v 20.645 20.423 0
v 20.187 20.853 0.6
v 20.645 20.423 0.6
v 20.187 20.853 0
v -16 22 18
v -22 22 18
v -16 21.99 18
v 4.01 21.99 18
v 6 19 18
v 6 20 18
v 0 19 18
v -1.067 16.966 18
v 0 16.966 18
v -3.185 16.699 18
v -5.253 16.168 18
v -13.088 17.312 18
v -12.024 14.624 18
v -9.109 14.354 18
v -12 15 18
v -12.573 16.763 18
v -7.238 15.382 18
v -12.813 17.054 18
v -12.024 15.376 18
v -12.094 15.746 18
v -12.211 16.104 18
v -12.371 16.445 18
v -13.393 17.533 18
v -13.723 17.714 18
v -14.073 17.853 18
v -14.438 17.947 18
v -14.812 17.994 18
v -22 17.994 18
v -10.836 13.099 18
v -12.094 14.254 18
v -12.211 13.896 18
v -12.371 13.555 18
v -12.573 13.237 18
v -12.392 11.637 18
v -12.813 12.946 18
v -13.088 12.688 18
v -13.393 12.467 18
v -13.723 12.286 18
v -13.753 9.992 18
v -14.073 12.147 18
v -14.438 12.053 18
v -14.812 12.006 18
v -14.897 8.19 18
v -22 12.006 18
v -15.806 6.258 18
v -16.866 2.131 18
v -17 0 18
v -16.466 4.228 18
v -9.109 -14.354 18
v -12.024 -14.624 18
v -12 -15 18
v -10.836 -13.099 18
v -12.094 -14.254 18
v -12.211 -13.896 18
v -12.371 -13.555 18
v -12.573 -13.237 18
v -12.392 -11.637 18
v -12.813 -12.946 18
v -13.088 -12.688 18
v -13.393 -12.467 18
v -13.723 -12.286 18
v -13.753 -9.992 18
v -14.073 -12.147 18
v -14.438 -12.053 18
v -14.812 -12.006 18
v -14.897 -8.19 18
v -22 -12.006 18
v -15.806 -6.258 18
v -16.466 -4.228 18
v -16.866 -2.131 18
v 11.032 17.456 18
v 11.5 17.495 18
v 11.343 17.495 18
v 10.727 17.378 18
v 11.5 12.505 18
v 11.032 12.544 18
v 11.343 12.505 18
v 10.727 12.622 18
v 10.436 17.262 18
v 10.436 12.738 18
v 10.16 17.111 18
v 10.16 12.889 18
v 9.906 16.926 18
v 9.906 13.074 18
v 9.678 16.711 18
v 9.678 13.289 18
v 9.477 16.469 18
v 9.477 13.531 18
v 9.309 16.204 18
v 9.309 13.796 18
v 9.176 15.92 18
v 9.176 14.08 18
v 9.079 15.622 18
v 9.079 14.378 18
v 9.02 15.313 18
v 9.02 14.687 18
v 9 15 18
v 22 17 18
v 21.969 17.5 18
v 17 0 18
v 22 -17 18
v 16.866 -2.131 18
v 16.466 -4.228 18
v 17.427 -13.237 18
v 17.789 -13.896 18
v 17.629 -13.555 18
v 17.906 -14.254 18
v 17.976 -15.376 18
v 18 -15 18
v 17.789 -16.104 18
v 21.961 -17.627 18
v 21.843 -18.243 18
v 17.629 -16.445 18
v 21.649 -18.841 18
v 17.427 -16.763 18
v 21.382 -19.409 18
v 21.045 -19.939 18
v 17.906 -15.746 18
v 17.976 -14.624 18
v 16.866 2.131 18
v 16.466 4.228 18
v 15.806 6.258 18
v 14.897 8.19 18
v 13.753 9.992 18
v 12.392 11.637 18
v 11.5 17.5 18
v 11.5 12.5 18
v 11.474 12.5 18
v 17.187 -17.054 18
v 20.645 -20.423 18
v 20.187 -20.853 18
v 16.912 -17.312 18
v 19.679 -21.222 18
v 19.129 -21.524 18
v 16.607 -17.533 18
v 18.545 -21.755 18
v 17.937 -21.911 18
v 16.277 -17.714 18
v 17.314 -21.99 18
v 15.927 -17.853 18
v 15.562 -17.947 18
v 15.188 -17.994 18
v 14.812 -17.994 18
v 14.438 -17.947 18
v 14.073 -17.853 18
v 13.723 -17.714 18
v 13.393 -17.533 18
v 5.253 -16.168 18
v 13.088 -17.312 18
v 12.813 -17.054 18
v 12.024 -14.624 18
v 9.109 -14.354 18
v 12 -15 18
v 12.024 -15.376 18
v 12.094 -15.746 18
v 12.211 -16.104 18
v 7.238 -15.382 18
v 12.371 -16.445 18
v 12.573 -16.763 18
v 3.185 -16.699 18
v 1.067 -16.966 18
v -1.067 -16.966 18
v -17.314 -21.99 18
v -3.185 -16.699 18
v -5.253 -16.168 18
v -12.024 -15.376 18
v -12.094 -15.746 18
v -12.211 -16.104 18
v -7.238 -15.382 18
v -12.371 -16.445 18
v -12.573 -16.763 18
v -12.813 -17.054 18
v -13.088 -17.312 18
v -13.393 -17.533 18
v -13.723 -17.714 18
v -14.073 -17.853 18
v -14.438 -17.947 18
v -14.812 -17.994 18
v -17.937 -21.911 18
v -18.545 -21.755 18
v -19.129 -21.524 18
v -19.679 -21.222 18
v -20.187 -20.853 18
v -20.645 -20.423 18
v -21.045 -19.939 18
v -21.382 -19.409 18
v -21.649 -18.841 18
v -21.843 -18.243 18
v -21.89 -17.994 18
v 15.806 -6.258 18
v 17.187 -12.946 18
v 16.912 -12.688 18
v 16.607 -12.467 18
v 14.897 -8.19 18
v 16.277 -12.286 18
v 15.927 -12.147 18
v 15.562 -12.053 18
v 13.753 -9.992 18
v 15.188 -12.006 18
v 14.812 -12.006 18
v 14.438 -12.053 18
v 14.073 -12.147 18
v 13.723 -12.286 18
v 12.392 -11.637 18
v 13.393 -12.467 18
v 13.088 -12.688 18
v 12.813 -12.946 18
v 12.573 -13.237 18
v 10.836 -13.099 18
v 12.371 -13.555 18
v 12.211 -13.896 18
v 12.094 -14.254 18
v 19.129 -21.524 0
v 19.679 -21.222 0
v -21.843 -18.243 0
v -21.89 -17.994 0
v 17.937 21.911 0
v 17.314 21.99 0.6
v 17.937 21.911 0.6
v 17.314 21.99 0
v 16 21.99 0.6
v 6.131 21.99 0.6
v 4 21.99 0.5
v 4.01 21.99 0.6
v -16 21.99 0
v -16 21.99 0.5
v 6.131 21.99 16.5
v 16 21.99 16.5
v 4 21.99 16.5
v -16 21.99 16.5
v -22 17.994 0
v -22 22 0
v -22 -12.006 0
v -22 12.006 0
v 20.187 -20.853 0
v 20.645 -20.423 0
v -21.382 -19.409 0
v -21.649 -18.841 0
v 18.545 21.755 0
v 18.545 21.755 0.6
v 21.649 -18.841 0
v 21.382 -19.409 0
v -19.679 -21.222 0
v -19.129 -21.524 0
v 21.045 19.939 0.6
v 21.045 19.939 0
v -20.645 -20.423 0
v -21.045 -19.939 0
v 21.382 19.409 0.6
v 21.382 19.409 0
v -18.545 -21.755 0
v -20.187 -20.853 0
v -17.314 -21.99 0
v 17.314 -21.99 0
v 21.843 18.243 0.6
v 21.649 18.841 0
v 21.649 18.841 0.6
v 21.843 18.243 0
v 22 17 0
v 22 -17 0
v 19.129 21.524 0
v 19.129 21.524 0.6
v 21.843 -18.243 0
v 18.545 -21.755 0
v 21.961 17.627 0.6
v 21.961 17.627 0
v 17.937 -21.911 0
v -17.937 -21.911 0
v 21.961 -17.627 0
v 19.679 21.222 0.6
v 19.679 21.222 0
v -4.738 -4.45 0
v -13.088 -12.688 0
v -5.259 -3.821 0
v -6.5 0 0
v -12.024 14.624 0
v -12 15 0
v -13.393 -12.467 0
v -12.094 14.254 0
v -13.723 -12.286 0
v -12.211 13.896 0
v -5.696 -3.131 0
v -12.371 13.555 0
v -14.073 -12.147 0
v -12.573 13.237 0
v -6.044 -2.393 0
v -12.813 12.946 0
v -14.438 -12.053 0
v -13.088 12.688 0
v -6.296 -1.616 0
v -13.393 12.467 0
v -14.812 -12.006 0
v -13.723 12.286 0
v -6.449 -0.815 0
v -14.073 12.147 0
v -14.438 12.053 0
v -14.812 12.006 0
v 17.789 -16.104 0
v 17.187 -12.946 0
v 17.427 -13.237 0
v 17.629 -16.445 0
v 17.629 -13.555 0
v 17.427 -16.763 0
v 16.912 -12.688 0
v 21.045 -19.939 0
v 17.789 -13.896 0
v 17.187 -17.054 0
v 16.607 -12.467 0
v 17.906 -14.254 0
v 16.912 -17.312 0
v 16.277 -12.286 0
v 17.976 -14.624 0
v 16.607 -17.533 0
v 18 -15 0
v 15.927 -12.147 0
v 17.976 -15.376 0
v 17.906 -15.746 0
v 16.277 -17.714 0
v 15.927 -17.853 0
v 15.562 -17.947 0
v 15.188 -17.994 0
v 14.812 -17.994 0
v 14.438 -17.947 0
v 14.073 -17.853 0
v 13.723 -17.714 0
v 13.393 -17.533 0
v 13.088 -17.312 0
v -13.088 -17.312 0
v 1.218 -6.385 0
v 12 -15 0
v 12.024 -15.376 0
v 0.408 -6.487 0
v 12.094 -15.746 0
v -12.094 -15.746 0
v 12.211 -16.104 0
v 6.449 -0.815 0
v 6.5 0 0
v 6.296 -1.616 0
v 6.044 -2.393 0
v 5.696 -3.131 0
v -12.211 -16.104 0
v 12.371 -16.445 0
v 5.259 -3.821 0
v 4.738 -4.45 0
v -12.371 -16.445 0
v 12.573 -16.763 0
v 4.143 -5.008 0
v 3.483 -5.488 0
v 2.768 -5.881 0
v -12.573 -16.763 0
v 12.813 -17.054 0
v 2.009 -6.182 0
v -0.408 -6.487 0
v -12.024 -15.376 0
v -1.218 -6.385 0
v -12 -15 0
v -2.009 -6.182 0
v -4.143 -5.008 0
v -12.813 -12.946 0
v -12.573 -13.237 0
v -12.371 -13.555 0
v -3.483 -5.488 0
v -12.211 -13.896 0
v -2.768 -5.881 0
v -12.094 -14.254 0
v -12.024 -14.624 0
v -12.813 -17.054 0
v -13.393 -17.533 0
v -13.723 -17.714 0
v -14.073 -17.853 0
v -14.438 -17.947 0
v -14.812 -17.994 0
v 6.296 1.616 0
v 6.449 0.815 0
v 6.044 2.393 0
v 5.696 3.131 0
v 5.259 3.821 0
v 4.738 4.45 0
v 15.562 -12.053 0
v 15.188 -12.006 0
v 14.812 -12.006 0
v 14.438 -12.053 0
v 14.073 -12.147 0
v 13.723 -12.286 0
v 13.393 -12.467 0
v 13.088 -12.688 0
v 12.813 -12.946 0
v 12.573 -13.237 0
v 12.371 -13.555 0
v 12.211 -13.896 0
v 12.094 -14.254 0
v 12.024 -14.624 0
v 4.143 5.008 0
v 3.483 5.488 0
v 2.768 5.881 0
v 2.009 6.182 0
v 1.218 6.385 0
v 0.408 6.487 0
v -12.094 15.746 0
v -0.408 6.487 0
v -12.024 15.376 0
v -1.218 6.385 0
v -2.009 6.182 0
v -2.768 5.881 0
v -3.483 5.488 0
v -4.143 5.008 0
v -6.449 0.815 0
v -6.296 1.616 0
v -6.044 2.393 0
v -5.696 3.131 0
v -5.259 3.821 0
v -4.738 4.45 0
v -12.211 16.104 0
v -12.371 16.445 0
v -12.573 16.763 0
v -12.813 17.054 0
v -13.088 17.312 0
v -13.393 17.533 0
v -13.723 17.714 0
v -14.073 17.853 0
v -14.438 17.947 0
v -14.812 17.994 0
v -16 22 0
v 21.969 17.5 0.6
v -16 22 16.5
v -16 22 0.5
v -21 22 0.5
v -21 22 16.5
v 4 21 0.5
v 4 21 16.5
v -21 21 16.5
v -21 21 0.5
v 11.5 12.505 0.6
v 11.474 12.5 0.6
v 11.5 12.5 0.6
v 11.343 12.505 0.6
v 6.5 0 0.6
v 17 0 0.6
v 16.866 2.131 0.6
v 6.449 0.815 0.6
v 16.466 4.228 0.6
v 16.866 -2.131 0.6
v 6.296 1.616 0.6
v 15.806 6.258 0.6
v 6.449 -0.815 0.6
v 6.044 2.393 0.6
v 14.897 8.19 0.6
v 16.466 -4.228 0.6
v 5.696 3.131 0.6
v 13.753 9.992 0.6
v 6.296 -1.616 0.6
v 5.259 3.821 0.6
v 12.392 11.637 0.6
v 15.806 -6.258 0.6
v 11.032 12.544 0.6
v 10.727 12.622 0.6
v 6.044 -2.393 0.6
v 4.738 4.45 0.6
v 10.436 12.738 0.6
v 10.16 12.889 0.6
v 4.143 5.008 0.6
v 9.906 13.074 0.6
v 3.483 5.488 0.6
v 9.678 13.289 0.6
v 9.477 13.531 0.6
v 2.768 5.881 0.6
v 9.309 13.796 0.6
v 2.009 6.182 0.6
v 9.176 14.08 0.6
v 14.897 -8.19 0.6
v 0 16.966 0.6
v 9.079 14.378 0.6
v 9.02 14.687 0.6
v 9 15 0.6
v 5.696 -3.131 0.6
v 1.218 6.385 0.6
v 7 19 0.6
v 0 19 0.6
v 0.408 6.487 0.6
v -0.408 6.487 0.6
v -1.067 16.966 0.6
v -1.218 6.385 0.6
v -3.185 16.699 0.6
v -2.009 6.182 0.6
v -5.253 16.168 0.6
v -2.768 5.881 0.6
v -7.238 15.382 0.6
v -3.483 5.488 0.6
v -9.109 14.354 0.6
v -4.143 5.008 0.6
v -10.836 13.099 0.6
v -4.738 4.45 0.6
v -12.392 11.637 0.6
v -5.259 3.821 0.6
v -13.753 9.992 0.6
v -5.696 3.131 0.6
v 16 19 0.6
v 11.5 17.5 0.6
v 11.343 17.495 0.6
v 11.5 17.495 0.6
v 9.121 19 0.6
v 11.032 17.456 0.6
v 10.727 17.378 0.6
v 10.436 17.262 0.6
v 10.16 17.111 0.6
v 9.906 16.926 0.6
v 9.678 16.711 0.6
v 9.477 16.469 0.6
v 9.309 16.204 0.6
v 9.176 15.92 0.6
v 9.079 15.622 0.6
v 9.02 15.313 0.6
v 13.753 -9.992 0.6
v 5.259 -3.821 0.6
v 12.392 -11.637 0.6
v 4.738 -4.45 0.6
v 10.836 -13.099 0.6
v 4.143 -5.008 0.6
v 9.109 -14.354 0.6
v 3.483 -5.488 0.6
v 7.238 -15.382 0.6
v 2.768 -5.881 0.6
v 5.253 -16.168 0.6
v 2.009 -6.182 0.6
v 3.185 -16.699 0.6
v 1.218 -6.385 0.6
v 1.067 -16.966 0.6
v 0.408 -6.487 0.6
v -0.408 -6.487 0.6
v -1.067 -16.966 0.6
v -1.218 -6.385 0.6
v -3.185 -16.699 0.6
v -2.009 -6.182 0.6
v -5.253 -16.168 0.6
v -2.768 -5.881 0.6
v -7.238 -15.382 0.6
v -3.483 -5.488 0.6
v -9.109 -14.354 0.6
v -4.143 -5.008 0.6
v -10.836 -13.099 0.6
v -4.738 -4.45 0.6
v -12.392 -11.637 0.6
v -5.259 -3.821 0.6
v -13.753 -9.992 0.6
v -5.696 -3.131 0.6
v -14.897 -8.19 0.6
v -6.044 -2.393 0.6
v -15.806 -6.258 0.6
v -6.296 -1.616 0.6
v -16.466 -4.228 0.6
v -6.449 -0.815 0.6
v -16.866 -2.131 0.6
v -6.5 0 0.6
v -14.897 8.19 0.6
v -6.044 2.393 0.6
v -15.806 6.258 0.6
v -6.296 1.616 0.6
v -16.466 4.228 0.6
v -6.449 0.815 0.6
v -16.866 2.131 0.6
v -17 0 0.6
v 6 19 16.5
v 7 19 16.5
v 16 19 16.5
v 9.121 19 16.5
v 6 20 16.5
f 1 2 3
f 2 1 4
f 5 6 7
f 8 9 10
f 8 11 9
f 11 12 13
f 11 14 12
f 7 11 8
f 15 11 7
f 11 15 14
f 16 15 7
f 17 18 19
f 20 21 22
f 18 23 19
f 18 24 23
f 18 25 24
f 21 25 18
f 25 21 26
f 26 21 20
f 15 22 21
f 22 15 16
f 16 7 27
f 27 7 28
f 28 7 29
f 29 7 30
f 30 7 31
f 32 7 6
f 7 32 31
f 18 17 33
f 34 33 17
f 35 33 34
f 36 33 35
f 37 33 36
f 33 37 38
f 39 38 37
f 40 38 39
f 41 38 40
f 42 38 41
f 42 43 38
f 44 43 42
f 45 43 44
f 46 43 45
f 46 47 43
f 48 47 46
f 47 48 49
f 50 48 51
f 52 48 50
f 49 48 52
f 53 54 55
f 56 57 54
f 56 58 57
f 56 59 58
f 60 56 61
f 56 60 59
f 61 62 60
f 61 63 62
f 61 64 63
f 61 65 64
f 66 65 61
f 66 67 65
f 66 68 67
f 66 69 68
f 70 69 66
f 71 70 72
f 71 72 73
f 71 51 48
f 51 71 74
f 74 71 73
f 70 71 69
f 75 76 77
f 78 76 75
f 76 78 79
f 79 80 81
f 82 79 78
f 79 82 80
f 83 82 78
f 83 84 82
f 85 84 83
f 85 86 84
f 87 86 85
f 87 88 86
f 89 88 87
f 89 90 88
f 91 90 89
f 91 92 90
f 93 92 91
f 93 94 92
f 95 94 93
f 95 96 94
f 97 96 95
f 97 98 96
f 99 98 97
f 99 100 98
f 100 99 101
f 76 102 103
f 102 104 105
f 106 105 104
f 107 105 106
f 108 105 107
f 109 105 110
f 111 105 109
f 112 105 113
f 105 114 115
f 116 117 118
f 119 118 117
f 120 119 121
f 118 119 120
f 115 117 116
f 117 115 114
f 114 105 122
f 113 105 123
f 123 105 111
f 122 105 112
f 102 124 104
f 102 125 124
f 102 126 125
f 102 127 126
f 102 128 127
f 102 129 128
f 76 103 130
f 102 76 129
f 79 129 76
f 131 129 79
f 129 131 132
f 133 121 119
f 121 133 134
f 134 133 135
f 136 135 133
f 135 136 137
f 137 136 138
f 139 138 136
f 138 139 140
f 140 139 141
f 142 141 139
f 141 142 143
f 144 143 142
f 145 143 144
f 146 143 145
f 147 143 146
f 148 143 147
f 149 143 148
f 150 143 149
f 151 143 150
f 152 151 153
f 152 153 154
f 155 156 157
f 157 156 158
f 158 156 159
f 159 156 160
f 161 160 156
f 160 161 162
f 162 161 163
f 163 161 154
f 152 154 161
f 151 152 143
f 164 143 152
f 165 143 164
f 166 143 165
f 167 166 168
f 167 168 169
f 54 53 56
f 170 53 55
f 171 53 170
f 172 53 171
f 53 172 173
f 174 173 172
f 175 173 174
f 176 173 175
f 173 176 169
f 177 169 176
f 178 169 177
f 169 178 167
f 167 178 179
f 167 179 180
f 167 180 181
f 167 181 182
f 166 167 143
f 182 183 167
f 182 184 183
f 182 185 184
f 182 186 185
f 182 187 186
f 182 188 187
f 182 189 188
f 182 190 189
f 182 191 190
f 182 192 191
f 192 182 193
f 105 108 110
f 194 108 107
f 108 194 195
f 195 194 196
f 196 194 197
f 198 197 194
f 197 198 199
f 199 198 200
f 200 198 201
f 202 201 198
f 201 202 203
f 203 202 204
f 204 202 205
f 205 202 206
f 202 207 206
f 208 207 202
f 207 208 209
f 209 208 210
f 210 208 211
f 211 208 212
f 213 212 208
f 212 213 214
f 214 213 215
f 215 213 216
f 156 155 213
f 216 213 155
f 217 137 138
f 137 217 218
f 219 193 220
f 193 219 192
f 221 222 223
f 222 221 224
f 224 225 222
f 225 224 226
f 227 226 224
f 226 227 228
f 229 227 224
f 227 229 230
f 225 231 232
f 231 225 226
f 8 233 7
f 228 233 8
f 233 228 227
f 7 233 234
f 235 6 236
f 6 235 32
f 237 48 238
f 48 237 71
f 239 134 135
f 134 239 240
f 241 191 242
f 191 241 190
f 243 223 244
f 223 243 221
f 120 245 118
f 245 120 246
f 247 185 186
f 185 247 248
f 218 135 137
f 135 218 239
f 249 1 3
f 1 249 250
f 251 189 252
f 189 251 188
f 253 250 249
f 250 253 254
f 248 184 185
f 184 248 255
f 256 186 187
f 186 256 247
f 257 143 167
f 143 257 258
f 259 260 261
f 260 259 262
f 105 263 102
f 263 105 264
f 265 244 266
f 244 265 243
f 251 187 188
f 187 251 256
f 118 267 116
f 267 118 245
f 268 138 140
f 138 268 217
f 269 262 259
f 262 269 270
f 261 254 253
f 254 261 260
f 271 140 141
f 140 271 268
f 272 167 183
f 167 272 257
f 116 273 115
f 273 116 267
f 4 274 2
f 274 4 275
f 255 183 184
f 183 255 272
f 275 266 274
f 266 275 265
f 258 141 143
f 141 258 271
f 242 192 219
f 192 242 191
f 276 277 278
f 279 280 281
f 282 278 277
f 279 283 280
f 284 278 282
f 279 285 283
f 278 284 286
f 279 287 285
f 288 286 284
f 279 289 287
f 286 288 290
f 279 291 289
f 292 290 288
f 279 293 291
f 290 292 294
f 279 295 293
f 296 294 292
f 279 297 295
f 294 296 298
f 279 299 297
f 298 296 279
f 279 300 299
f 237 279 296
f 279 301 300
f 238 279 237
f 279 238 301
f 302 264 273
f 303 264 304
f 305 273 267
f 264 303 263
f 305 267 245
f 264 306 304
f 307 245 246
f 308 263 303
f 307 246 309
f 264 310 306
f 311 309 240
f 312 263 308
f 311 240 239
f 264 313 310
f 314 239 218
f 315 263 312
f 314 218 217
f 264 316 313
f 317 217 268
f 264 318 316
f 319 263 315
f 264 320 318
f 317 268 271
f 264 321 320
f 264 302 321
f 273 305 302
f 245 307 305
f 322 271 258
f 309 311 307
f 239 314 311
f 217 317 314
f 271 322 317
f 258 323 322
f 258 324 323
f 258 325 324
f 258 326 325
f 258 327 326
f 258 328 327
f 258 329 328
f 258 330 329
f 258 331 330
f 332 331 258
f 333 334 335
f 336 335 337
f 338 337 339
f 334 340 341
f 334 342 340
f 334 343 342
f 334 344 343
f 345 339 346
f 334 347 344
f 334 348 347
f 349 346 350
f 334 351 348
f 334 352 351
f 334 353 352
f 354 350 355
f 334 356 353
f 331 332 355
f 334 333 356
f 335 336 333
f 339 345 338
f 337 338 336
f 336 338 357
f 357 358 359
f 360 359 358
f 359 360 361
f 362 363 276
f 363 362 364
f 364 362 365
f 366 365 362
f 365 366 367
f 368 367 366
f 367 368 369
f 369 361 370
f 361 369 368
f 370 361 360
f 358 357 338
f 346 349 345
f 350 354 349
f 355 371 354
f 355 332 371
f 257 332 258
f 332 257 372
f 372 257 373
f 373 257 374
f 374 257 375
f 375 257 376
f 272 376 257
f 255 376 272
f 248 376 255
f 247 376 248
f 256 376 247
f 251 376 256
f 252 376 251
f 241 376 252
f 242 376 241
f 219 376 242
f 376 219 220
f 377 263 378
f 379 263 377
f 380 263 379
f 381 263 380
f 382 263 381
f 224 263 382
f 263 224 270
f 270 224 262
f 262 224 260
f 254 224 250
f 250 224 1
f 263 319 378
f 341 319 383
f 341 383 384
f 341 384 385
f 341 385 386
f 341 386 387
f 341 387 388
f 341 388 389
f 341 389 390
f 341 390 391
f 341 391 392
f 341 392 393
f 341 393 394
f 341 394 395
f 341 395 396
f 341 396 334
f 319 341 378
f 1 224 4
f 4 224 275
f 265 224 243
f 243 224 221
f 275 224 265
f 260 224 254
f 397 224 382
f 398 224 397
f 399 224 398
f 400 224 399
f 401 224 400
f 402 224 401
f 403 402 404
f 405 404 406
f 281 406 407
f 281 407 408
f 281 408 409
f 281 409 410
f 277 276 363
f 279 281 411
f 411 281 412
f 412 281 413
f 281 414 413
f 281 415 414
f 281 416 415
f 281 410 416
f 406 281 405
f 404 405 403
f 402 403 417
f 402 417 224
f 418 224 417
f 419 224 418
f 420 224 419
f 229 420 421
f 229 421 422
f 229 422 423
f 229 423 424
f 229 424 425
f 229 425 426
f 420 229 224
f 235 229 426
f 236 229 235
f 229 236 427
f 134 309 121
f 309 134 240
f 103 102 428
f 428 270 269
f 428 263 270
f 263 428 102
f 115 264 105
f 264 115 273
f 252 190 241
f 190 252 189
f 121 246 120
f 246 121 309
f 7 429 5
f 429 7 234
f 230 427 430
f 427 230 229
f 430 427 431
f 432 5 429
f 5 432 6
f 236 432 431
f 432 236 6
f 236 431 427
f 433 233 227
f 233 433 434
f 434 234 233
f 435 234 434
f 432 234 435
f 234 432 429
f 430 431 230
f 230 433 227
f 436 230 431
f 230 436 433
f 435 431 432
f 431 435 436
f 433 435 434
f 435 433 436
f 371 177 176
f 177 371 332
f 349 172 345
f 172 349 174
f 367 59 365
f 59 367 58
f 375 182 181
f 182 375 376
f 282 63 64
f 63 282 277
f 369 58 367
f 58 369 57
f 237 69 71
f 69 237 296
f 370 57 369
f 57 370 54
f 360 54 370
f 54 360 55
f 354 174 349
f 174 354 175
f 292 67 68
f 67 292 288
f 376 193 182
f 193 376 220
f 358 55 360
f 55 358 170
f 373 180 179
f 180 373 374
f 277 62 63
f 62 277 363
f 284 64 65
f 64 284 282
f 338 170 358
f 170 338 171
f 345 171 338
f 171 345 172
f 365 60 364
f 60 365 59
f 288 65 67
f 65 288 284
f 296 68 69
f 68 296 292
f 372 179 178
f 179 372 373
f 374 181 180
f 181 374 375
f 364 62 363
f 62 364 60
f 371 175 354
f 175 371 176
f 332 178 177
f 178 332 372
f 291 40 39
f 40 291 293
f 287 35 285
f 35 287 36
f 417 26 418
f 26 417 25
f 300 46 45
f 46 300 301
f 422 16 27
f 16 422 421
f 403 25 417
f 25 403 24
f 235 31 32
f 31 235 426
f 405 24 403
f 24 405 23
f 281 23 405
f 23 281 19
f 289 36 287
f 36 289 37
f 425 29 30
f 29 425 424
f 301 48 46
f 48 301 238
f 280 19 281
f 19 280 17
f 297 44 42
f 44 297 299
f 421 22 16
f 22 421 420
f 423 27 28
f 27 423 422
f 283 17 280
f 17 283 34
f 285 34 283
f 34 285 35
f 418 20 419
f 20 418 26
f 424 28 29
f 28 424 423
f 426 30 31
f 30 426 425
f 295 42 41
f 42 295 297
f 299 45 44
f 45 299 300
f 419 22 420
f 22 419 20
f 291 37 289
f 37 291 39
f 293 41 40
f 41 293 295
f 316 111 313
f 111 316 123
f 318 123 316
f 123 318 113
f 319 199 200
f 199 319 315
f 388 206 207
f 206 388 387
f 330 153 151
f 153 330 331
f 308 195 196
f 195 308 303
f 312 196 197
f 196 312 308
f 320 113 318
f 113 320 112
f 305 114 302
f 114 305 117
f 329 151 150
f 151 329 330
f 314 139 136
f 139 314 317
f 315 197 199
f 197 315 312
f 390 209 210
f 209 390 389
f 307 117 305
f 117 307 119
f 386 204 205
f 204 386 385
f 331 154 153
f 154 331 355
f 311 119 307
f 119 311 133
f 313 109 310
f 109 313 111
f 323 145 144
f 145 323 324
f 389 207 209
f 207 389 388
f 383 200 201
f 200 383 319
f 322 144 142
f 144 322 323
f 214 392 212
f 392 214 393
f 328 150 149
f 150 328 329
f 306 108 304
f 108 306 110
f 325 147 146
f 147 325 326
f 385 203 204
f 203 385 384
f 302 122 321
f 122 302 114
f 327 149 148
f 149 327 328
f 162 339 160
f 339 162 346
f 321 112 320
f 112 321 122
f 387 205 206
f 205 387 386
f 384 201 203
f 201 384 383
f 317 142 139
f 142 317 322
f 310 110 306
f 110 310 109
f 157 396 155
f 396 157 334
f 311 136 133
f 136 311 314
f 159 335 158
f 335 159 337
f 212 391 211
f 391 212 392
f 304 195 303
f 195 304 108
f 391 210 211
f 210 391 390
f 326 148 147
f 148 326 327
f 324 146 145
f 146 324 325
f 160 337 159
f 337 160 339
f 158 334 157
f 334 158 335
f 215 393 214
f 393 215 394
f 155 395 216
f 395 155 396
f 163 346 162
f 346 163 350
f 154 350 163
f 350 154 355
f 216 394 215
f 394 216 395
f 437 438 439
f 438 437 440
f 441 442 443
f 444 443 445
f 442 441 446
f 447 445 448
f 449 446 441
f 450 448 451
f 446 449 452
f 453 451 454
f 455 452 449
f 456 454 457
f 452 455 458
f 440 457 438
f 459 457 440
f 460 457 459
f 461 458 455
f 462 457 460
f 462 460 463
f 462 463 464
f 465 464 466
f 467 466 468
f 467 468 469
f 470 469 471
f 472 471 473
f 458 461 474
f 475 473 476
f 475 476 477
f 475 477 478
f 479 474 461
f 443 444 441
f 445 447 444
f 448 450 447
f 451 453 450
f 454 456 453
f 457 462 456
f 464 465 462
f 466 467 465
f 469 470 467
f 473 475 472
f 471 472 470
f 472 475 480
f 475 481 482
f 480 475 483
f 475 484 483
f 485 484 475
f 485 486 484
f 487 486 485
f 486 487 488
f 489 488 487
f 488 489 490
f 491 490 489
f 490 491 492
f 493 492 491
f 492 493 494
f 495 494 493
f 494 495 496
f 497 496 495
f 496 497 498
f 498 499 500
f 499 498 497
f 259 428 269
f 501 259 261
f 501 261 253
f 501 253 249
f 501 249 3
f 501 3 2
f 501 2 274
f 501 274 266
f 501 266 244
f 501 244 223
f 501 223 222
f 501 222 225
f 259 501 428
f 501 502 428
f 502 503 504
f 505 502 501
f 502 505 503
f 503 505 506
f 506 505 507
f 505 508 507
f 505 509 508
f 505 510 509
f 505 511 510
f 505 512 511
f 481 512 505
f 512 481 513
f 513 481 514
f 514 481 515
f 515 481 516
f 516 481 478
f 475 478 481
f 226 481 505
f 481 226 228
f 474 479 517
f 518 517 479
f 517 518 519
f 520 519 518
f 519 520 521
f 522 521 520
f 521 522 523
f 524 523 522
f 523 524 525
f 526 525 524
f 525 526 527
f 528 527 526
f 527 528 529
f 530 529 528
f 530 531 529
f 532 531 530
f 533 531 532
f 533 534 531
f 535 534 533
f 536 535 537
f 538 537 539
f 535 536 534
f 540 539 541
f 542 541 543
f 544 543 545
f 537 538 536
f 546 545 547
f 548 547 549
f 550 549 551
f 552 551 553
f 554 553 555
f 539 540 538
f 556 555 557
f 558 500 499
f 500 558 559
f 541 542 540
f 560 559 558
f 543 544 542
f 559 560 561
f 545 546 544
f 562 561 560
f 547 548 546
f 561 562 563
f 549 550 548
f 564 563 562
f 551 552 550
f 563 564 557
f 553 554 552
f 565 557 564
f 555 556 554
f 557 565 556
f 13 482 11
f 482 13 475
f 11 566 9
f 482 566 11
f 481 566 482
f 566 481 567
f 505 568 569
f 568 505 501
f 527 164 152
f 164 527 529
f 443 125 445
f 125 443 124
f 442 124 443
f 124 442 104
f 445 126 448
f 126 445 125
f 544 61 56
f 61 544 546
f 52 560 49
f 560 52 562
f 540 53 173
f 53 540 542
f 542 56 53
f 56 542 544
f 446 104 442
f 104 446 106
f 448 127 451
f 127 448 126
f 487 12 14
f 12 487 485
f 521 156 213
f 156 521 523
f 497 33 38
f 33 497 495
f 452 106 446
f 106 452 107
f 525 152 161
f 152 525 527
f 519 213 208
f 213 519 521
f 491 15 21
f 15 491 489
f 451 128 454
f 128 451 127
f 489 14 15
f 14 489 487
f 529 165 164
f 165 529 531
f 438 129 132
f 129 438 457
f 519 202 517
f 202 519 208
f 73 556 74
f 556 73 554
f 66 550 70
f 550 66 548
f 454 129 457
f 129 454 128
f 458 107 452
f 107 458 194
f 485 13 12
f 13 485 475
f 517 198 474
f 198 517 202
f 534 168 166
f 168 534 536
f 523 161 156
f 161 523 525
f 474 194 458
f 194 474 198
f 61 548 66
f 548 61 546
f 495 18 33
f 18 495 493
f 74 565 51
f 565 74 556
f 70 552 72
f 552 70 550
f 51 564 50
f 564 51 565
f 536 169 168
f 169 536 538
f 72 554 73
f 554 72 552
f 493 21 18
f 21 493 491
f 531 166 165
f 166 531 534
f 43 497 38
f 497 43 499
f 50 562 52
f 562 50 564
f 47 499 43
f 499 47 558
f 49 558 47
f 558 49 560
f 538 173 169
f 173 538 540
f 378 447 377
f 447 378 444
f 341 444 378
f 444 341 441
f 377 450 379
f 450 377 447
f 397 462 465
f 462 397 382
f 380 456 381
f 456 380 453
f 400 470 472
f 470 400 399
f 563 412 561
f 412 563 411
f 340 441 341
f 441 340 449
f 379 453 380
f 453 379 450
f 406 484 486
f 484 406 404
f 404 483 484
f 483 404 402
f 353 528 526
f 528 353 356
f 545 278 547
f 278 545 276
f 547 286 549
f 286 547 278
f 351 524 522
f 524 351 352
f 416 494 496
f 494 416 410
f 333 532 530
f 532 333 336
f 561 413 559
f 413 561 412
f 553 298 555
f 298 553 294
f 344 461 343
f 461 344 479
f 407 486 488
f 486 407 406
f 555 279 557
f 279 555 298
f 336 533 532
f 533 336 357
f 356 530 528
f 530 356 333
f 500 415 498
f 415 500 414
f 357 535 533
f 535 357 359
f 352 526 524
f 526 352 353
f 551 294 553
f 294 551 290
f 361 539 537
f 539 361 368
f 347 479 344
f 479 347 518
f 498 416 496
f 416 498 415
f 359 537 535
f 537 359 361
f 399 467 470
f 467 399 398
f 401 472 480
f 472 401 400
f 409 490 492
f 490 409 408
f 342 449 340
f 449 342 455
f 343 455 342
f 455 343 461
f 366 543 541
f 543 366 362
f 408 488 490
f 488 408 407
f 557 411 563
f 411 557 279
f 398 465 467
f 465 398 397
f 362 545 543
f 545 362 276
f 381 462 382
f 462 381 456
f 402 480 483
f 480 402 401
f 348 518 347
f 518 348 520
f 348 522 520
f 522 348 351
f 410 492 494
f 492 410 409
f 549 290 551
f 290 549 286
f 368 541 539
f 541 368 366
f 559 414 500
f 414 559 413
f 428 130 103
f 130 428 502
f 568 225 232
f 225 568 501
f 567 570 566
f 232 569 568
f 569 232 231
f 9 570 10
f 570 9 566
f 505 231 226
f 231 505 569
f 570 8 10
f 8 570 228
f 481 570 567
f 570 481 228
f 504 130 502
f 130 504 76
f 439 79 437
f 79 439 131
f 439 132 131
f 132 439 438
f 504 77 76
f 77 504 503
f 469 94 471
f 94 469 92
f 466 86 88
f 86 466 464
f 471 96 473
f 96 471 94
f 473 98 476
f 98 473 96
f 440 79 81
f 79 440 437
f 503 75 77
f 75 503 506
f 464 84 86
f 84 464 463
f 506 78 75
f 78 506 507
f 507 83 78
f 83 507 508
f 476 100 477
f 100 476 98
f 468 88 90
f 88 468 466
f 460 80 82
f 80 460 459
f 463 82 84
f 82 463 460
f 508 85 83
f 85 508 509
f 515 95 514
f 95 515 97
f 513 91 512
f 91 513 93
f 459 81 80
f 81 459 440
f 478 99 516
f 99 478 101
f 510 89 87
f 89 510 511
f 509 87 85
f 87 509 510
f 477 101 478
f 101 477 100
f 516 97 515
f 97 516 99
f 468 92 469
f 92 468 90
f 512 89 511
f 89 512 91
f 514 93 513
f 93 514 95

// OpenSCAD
$fn = 50;


union() {
	difference() {
		union() {
			translate(v = [0, 0, 0]) {
				rotate(a = [0, 0, 0]) {
					hull() {
						translate(v = [-17.0000000000, 17.0000000000, 0]) {
							rotate(a = [0, 0, 0]) {
								translate(v = [0, 0, 0]) {
									rotate(a = [0, 0, 0]) {
										cylinder(h = 18, r = 5);
									}
								}
							}
						}
						translate(v = [17.0000000000, 17.0000000000, 0]) {
							rotate(a = [0, 0, 0]) {
								translate(v = [0, 0, 0]) {
									rotate(a = [0, 0, 0]) {
										cylinder(h = 18, r = 5);
									}
								}
							}
						}
						translate(v = [-17.0000000000, -17.0000000000, 0]) {
							rotate(a = [0, 0, 0]) {
								translate(v = [0, 0, 0]) {
									rotate(a = [0, 0, 0]) {
										cylinder(h = 18, r = 5);
									}
								}
							}
						}
						translate(v = [17.0000000000, -17.0000000000, 0]) {
							rotate(a = [0, 0, 0]) {
								translate(v = [0, 0, 0]) {
									rotate(a = [0, 0, 0]) {
										cylinder(h = 18, r = 5);
									}
								}
							}
						}
					}
				}
			}
			translate(v = [-22.0000000000, 16.0000000000, 0]) {
				rotate(a = [0, 0, 0]) {
					cube(size = [6, 6, 18]);
				}
			}
		}
		union() {
			#translate(v = [-21.0000000000, 21.0000000000, 0.5000000000]) {
				rotate(a = [0, 0, 0]) {
					cube(size = [25, 1, 16]);
				}
			}
			translate(v = [-22.5000000000, -15.0000000000, -125]) {
				rotate(a = [0, 0, 0]) {
					hull() {
						translate(v = [7.5000000000, 0, 0]) {
							rotate(a = [0, 0, 0]) {
								translate(v = [0, 0, 0]) {
									rotate(a = [0, 0, 0]) {
										cylinder(h = 250, r = 3.0000000000);
									}
								}
							}
						}
						translate(v = [-7.5000000000, 0, 0]) {
							rotate(a = [0, 0, 0]) {
								translate(v = [0, 0, 0]) {
									rotate(a = [0, 0, 0]) {
										cylinder(h = 250, r = 3.0000000000);
									}
								}
							}
						}
					}
				}
			}
			translate(v = [-22.5000000000, 15.0000000000, -125]) {
				rotate(a = [0, 0, 0]) {
					hull() {
						translate(v = [7.5000000000, 0, 0]) {
							rotate(a = [0, 0, 0]) {
								translate(v = [0, 0, 0]) {
									rotate(a = [0, 0, 0]) {
										cylinder(h = 250, r = 3.0000000000);
									}
								}
							}
						}
						translate(v = [-7.5000000000, 0, 0]) {
							rotate(a = [0, 0, 0]) {
								translate(v = [0, 0, 0]) {
									rotate(a = [0, 0, 0]) {
										cylinder(h = 250, r = 3.0000000000);
									}
								}
							}
						}
					}
				}
			}
			translate(v = [15.0000000000, -15.0000000000, -125.0000000000]) {
				rotate(a = [0, 0, 0]) {
					cylinder(h = 250, r = 3.0000000000);
				}
			}
			translate(v = [0.0000000000, 11.0000000000, 0.6000000000]) {
				rotate(a = [0, 0, 0]) {
					cube(size = [11, 8, 20.4000000000]);
				}
			}
			translate(v = [0, 0, 0.6000000000]) {
				rotate(a = [0, 0, 0]) {
					cylinder(h = 20.4000000000, r = 17.0000000000);
				}
			}
			translate(v = [0, 0, -9.0000000000]) {
				rotate(a = [0, 0, 0]) {
					cylinder(h = 18, r = 6.5000000000);
				}
			}
			translate(v = [0.0000000000, 17.5000000000, 0.6000000000]) {
				rotate(a = [0, 0, 0]) {
					cube(size = [22.0000000000, 1.5000000000, 20.4000000000]);
				}
			}
			translate(v = [16.0000000000, 17.5000000000, 0.6000000000]) {
				rotate(a = [0, 0, 0]) {
					cube(size = [6, 4.5000000000, 20.4000000000]);
				}
			}
			translate(v = [6.0000000000, 17.5000000000, 16.5000000000]) {
				rotate(a = [0, 0, 0]) {
					cube(size = [16, 4.5000000000, 1.5000000000]);
				}
			}
			translate(v = [3.2500000000, 22.7500000000, 0.6000000000]) {
				rotate(a = [0, 0, -45]) {
					cube(size = [7.5000000000, 1.5000000000, 20.4000000000]);
				}
			}
			translate(v = [2.5000000000, 12.5000000000, 0.6000000000]) {
				rotate(a = [0, 0, 0]) {
					cube(size = [9.0000000000, 5, 17.4000000000]);
				}
			}
		}
	}
	union() {
		translate(v = [14, 15.0000000000, 0]) {
			rotate(a = [0, 0, 0]) {
				hull() {
					translate(v = [2.5000000000, 0, 0]) {
						rotate(a = [0, 0, 0]) {
							#translate(v = [0, 0, 0]) {
								rotate(a = [0, 0, 0]) {
									cylinder(h = 18, r = 2.5000000000);
								}
							}
						}
					}
					translate(v = [-2.5000000000, 0, 0]) {
						rotate(a = [0, 0, 0]) {
							#translate(v = [0, 0, 0]) {
								rotate(a = [0, 0, 0]) {
									cylinder(h = 18, r = 2.5000000000);
								}
							}
						}
					}
				}
			}
		}
	}
}
